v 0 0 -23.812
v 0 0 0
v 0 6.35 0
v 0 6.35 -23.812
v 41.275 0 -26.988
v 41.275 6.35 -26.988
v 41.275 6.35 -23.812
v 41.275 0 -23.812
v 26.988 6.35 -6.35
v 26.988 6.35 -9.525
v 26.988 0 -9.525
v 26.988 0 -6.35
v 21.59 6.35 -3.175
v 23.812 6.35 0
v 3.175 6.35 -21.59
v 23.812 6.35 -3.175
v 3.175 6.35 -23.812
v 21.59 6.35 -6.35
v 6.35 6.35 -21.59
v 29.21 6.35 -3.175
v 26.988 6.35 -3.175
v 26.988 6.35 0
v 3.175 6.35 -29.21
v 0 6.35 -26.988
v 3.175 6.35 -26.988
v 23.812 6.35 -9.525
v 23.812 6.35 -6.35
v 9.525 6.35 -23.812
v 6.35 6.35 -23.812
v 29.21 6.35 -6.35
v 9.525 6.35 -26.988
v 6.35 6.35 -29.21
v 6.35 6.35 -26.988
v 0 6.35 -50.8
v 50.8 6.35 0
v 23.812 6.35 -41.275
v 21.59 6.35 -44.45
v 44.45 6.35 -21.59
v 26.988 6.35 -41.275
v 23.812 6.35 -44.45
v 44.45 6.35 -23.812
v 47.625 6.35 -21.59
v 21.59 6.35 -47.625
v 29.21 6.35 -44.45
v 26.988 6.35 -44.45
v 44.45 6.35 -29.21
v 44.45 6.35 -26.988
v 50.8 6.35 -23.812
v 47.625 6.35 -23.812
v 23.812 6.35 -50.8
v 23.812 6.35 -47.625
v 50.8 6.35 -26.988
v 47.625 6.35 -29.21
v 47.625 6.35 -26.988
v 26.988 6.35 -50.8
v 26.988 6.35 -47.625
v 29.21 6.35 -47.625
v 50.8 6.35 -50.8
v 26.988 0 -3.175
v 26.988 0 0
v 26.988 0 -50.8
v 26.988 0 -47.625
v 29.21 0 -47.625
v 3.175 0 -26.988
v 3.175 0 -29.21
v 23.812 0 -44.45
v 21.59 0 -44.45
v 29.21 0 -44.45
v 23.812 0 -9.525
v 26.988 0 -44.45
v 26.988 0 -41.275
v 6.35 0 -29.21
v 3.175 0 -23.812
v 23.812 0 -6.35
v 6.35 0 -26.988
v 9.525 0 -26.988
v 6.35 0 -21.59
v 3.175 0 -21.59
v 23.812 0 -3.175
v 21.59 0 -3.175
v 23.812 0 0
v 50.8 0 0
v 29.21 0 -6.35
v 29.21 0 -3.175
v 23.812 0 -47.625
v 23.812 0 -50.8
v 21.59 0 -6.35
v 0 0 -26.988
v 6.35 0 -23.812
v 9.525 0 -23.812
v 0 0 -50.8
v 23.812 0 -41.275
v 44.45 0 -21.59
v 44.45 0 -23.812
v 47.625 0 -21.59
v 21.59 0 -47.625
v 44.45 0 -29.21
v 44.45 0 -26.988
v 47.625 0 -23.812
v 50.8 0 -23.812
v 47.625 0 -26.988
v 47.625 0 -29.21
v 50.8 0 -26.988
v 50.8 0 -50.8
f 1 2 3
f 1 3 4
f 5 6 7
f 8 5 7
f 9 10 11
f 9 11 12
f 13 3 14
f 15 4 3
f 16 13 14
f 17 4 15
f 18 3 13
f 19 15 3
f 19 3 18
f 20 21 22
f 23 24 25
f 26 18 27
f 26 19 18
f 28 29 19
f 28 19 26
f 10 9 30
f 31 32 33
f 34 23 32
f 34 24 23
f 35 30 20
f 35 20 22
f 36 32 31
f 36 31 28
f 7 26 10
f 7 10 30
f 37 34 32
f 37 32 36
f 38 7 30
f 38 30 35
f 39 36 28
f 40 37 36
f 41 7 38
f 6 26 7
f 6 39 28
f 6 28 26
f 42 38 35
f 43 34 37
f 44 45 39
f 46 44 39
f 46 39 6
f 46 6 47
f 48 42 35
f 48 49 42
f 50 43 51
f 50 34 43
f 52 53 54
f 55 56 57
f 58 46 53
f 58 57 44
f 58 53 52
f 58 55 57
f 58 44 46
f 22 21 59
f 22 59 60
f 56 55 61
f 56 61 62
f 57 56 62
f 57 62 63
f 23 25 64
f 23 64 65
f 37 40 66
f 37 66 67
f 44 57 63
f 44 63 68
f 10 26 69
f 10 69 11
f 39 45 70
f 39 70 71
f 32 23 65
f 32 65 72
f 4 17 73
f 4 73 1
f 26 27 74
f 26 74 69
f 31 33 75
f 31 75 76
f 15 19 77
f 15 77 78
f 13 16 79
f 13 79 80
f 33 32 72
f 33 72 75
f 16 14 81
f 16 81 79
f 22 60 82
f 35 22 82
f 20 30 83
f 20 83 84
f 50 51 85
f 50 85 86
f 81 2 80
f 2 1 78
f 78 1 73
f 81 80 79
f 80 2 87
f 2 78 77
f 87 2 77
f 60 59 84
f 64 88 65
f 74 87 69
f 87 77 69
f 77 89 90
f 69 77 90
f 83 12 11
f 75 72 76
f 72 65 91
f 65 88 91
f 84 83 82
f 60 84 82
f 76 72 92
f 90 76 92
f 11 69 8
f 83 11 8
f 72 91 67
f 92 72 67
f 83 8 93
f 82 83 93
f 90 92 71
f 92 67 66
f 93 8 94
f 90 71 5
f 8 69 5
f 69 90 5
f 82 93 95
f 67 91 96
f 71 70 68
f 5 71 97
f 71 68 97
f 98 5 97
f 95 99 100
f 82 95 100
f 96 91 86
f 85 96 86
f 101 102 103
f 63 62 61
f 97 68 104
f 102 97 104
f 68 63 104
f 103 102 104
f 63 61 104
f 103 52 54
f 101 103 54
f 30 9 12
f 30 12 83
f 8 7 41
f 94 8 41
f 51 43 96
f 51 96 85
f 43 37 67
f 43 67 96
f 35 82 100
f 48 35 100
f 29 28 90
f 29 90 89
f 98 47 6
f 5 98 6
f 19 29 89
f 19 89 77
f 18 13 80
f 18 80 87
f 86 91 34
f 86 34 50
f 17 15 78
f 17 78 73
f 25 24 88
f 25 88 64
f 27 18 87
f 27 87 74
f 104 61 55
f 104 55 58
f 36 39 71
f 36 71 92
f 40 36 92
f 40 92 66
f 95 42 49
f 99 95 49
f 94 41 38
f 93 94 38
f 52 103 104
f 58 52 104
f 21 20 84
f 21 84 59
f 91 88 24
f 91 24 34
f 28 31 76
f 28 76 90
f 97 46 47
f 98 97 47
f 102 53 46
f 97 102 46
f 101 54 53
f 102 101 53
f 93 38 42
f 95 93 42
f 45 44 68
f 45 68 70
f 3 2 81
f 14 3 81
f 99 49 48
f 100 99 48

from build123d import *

# Parameters (mm, degrees)
SKETCH1_W           = 50.8
SKETCH1_H           = 50.8
BOSS_EXTRUDE1_DEPTH = 6.35
CUT_EXTRUDE6_DEPTH  = 73.122135992


with BuildPart() as part:
    # Sketch1 → Boss-Extrude1 (new body)
    with BuildSketch(Plane(origin=(0, 0, 0), x_dir=(1, 0, 0), z_dir=(0, 1, 0))):
        with Locations((25.4, 25.4)):
            Rectangle(SKETCH1_W, SKETCH1_H)
    extrude(amount=BOSS_EXTRUDE1_DEPTH)

    # Sketch2 → Cut-Extrude6 (cut, through all)
    with BuildSketch(Plane(origin=(0, 6.35, 0), x_dir=(1, 0, 0), z_dir=(0, 1, 0))):
        Polygon((21.59, 47.625), (23.8125, 47.625), (23.8125, 50.8), (26.9875, 50.8), (26.9875, 47.625), (29.21, 47.625), (29.21, 44.45), (26.9875, 44.45), (26.9875, 41.275), (23.8125, 41.275), (23.8125, 44.45), (21.59, 44.45), align=None)
        Polygon((26.9875, 6.35), (29.21, 6.35), (29.21, 3.175), (26.9875, 3.175), (26.9875, 0), (23.8125, 0), (23.8125, 3.175), (21.59, 3.175), (21.59, 6.35), (23.8125, 6.35), (23.8125, 9.525), (26.9875, 9.525), align=None)
        Polygon((3.175, 26.9875), (3.175, 29.21), (6.35, 29.21), (6.35, 26.9875), (9.525, 26.9875), (9.525, 23.8125), (6.35, 23.8125), (6.35, 21.59), (3.175, 21.59), (3.175, 23.8125), (0, 23.8125), (0, 26.9875), align=None)
        Polygon((47.625, 23.8125), (50.8, 23.8125), (50.8, 26.9875), (47.625, 26.9875), (47.625, 29.21), (44.45, 29.21), (44.45, 26.9875), (41.275, 26.9875), (41.275, 23.8125), (44.45, 23.8125), (44.45, 21.59), (47.625, 21.59), align=None)
    extrude(amount=-CUT_EXTRUDE6_DEPTH, mode=Mode.SUBTRACT)


solid = part.part
